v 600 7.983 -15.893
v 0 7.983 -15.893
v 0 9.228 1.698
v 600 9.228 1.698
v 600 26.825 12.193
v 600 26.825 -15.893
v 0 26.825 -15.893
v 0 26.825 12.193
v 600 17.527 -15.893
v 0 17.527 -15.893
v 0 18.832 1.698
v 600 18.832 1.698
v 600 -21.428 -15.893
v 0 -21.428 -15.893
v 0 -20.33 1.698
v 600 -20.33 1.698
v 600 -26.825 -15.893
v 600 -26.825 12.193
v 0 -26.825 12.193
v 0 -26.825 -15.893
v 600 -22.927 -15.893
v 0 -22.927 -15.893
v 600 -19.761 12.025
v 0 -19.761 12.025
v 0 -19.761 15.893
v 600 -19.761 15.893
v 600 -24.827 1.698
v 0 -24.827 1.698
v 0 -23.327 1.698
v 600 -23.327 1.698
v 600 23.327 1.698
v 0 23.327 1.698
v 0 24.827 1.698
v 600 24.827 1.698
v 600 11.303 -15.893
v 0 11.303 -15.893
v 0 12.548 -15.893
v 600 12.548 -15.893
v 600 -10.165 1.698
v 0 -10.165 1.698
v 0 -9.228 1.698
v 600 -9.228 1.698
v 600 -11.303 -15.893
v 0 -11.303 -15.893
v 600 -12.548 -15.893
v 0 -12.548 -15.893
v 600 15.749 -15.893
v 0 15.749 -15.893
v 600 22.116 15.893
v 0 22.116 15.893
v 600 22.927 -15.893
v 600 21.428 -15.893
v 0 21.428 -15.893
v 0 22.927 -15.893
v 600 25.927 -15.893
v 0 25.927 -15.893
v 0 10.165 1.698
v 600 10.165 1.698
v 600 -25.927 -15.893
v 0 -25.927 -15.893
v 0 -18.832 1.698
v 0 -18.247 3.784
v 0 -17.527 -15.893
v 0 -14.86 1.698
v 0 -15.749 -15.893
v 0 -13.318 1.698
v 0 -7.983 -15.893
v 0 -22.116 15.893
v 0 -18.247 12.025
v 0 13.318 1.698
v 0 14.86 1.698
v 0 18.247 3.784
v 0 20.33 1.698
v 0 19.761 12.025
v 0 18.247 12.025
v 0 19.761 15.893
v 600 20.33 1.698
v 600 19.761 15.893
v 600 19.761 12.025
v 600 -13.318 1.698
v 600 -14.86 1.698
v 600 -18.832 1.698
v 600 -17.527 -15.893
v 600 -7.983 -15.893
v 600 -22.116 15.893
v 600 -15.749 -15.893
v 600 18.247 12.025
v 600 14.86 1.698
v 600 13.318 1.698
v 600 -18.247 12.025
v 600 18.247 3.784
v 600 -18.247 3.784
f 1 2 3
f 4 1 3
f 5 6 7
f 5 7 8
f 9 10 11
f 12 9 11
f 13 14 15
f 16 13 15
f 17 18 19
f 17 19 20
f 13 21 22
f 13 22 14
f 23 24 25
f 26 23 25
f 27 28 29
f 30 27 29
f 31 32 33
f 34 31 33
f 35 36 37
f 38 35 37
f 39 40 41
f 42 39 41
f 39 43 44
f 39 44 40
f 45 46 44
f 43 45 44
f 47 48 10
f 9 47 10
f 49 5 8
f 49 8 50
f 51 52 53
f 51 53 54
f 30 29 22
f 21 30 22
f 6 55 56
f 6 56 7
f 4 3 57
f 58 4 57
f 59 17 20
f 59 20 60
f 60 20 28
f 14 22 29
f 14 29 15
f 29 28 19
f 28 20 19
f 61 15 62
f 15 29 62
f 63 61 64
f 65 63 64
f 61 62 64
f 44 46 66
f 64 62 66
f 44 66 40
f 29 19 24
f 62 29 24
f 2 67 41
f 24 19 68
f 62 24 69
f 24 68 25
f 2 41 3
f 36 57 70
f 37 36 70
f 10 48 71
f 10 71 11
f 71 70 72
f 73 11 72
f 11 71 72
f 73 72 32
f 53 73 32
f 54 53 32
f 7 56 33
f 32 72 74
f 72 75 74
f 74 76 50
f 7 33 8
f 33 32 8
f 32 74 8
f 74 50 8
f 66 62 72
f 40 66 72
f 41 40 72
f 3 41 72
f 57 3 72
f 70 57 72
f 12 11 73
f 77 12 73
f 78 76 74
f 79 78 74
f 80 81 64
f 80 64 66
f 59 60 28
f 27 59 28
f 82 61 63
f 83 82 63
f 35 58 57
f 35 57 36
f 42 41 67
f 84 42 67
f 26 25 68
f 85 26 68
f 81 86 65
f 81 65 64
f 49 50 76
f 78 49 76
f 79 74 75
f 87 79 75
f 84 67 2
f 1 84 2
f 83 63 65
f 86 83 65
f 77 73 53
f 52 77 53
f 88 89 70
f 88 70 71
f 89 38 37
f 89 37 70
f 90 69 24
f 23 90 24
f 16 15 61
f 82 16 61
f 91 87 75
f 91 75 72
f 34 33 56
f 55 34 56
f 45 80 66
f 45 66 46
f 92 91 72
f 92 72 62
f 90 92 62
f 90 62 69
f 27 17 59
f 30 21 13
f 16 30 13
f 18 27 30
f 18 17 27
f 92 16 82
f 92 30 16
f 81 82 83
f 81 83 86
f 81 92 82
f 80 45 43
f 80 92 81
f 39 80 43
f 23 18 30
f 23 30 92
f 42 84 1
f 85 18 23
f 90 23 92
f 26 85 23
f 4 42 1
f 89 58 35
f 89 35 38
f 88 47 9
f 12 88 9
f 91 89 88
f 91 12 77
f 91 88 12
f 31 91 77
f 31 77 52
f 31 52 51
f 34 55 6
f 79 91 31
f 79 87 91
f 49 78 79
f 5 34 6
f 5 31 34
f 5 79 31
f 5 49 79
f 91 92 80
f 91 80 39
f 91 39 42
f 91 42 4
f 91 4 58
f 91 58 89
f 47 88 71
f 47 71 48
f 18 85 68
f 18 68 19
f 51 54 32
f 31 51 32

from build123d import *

# Parameters (mm, degrees)
F1_DEPTH = 600


with BuildPart() as f1:
    # F0 (on Right) → F1 (new body)
    with BuildSketch(Plane.YZ):
        Polygon((-19.76107, 15.892943), (-22.115579, 15.892943), (-26.824599, 12.192998), (-26.824599, -15.892943), (-25.926842, -15.892943), (-24.826841, 1.698052), (-23.326841, 1.698052), (-22.926842, -15.892943), (-21.428242, -15.892943), (-20.329641, 1.698052), (-18.83157, 1.698052), (-17.527344, -15.892943), (-15.748855, -15.892943), (-14.859609, 1.698052), (-13.318252, 1.698052), (-12.547573, -15.892943), (-11.30263, -15.892943), (-10.16482, 1.698052), (-9.227727, 1.698052), (-7.982784, -15.892943), (7.982784, -15.892943), (9.227727, 1.698052), (10.16482, 1.698052), (11.30263, -15.892943), (12.547573, -15.892943), (13.318252, 1.698052), (14.859609, 1.698052), (15.748855, -15.892943), (17.527344, -15.892943), (18.83157, 1.698052), (20.329641, 1.698052), (21.428242, -15.892943), (22.926842, -15.892943), (23.326841, 1.698052), (24.826841, 1.698052), (25.926842, -15.892943), (26.824599, -15.892943), (26.824599, 12.192998), (22.115579, 15.892943), (19.76107, 15.892943), (19.76107, 12.024819), (18.247455, 12.024819), (18.247455, 3.784032), (0, 3.784032), (-18.247455, 3.784032), (-18.247455, 12.024819), (-19.76107, 12.024819), align=None)
    extrude(amount=F1_DEPTH)


solid = f1.part
